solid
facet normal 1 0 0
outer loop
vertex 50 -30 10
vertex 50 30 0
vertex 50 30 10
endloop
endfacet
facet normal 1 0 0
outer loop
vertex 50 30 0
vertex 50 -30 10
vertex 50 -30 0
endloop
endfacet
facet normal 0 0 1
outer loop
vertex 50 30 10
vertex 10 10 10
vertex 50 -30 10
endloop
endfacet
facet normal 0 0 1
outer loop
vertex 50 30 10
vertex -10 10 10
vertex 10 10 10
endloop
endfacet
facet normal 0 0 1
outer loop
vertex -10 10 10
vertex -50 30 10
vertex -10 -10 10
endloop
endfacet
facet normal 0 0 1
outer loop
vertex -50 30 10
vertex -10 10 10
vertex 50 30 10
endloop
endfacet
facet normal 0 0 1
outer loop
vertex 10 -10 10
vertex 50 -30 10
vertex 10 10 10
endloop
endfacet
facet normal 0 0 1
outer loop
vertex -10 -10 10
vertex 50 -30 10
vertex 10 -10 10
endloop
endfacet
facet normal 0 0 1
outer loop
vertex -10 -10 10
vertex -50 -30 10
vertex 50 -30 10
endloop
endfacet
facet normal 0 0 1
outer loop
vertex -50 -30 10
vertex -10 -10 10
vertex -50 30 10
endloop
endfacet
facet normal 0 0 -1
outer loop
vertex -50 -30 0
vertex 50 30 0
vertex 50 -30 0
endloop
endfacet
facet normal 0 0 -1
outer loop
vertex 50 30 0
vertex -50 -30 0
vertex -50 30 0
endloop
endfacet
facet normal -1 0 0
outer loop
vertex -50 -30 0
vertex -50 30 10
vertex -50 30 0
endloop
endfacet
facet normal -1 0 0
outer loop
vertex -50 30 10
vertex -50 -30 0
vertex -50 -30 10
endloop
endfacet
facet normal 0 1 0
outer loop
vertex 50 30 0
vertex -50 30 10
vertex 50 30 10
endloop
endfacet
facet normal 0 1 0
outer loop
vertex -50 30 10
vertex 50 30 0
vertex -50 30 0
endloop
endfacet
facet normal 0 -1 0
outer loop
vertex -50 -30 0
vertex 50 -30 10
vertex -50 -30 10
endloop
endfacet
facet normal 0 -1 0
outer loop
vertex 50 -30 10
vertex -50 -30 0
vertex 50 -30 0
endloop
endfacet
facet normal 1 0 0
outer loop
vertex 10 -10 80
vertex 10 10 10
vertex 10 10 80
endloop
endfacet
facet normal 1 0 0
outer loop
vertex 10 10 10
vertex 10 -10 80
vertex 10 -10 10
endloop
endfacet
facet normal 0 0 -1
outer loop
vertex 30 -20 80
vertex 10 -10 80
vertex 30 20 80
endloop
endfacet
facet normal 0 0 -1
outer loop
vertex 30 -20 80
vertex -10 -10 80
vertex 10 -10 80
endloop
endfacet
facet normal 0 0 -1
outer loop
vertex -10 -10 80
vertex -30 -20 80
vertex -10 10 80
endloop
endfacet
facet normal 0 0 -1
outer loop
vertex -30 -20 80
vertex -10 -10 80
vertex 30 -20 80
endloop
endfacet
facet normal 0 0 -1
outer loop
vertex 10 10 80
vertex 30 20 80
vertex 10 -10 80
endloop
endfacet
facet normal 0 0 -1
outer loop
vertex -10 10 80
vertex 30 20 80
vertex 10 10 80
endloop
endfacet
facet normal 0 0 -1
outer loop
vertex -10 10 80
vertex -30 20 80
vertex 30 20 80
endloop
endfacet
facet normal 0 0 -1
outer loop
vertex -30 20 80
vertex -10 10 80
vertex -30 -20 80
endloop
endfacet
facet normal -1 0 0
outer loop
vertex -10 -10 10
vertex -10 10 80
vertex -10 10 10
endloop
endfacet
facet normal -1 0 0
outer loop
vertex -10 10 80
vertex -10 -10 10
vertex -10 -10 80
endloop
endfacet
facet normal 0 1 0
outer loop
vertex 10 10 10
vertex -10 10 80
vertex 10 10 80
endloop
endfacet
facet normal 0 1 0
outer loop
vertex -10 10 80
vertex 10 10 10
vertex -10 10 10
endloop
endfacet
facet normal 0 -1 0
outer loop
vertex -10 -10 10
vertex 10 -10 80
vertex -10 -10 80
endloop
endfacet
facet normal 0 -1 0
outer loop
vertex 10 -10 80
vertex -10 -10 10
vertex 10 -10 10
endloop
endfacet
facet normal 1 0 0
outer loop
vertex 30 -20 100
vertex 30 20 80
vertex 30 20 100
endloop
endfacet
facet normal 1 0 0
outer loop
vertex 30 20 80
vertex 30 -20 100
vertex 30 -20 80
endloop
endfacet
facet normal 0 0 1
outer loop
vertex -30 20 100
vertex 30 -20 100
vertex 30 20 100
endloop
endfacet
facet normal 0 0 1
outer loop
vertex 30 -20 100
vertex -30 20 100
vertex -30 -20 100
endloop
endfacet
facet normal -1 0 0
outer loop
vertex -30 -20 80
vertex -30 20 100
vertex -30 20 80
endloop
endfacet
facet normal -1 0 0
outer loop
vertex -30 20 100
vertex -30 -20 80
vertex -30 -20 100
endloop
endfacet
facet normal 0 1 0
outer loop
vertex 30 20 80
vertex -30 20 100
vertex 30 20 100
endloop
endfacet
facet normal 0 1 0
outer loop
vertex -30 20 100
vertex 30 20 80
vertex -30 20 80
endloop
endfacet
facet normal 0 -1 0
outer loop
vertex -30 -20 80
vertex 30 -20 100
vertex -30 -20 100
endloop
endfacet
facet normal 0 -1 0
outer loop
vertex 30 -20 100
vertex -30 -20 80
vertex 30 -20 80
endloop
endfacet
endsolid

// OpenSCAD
// Automatic drill press model (OpenSCAD)
// Simple block-based approximation: base, column, head, spindle

// Base
translate([-50, -30, 0]) cube([100, 60, 10]);
// Column
translate([-10, -10, 10]) cube([20, 20, 70]);
// Head
translate([-30, -20, 80]) cube([60, 40, 20]);
// Spindle
translate([-2, -2, 60]) cube([4, 4, 20]);

// Export this to STL in OpenSCAD (`File -> Export -> Export as STL`) to get a higher-quality mesh.
